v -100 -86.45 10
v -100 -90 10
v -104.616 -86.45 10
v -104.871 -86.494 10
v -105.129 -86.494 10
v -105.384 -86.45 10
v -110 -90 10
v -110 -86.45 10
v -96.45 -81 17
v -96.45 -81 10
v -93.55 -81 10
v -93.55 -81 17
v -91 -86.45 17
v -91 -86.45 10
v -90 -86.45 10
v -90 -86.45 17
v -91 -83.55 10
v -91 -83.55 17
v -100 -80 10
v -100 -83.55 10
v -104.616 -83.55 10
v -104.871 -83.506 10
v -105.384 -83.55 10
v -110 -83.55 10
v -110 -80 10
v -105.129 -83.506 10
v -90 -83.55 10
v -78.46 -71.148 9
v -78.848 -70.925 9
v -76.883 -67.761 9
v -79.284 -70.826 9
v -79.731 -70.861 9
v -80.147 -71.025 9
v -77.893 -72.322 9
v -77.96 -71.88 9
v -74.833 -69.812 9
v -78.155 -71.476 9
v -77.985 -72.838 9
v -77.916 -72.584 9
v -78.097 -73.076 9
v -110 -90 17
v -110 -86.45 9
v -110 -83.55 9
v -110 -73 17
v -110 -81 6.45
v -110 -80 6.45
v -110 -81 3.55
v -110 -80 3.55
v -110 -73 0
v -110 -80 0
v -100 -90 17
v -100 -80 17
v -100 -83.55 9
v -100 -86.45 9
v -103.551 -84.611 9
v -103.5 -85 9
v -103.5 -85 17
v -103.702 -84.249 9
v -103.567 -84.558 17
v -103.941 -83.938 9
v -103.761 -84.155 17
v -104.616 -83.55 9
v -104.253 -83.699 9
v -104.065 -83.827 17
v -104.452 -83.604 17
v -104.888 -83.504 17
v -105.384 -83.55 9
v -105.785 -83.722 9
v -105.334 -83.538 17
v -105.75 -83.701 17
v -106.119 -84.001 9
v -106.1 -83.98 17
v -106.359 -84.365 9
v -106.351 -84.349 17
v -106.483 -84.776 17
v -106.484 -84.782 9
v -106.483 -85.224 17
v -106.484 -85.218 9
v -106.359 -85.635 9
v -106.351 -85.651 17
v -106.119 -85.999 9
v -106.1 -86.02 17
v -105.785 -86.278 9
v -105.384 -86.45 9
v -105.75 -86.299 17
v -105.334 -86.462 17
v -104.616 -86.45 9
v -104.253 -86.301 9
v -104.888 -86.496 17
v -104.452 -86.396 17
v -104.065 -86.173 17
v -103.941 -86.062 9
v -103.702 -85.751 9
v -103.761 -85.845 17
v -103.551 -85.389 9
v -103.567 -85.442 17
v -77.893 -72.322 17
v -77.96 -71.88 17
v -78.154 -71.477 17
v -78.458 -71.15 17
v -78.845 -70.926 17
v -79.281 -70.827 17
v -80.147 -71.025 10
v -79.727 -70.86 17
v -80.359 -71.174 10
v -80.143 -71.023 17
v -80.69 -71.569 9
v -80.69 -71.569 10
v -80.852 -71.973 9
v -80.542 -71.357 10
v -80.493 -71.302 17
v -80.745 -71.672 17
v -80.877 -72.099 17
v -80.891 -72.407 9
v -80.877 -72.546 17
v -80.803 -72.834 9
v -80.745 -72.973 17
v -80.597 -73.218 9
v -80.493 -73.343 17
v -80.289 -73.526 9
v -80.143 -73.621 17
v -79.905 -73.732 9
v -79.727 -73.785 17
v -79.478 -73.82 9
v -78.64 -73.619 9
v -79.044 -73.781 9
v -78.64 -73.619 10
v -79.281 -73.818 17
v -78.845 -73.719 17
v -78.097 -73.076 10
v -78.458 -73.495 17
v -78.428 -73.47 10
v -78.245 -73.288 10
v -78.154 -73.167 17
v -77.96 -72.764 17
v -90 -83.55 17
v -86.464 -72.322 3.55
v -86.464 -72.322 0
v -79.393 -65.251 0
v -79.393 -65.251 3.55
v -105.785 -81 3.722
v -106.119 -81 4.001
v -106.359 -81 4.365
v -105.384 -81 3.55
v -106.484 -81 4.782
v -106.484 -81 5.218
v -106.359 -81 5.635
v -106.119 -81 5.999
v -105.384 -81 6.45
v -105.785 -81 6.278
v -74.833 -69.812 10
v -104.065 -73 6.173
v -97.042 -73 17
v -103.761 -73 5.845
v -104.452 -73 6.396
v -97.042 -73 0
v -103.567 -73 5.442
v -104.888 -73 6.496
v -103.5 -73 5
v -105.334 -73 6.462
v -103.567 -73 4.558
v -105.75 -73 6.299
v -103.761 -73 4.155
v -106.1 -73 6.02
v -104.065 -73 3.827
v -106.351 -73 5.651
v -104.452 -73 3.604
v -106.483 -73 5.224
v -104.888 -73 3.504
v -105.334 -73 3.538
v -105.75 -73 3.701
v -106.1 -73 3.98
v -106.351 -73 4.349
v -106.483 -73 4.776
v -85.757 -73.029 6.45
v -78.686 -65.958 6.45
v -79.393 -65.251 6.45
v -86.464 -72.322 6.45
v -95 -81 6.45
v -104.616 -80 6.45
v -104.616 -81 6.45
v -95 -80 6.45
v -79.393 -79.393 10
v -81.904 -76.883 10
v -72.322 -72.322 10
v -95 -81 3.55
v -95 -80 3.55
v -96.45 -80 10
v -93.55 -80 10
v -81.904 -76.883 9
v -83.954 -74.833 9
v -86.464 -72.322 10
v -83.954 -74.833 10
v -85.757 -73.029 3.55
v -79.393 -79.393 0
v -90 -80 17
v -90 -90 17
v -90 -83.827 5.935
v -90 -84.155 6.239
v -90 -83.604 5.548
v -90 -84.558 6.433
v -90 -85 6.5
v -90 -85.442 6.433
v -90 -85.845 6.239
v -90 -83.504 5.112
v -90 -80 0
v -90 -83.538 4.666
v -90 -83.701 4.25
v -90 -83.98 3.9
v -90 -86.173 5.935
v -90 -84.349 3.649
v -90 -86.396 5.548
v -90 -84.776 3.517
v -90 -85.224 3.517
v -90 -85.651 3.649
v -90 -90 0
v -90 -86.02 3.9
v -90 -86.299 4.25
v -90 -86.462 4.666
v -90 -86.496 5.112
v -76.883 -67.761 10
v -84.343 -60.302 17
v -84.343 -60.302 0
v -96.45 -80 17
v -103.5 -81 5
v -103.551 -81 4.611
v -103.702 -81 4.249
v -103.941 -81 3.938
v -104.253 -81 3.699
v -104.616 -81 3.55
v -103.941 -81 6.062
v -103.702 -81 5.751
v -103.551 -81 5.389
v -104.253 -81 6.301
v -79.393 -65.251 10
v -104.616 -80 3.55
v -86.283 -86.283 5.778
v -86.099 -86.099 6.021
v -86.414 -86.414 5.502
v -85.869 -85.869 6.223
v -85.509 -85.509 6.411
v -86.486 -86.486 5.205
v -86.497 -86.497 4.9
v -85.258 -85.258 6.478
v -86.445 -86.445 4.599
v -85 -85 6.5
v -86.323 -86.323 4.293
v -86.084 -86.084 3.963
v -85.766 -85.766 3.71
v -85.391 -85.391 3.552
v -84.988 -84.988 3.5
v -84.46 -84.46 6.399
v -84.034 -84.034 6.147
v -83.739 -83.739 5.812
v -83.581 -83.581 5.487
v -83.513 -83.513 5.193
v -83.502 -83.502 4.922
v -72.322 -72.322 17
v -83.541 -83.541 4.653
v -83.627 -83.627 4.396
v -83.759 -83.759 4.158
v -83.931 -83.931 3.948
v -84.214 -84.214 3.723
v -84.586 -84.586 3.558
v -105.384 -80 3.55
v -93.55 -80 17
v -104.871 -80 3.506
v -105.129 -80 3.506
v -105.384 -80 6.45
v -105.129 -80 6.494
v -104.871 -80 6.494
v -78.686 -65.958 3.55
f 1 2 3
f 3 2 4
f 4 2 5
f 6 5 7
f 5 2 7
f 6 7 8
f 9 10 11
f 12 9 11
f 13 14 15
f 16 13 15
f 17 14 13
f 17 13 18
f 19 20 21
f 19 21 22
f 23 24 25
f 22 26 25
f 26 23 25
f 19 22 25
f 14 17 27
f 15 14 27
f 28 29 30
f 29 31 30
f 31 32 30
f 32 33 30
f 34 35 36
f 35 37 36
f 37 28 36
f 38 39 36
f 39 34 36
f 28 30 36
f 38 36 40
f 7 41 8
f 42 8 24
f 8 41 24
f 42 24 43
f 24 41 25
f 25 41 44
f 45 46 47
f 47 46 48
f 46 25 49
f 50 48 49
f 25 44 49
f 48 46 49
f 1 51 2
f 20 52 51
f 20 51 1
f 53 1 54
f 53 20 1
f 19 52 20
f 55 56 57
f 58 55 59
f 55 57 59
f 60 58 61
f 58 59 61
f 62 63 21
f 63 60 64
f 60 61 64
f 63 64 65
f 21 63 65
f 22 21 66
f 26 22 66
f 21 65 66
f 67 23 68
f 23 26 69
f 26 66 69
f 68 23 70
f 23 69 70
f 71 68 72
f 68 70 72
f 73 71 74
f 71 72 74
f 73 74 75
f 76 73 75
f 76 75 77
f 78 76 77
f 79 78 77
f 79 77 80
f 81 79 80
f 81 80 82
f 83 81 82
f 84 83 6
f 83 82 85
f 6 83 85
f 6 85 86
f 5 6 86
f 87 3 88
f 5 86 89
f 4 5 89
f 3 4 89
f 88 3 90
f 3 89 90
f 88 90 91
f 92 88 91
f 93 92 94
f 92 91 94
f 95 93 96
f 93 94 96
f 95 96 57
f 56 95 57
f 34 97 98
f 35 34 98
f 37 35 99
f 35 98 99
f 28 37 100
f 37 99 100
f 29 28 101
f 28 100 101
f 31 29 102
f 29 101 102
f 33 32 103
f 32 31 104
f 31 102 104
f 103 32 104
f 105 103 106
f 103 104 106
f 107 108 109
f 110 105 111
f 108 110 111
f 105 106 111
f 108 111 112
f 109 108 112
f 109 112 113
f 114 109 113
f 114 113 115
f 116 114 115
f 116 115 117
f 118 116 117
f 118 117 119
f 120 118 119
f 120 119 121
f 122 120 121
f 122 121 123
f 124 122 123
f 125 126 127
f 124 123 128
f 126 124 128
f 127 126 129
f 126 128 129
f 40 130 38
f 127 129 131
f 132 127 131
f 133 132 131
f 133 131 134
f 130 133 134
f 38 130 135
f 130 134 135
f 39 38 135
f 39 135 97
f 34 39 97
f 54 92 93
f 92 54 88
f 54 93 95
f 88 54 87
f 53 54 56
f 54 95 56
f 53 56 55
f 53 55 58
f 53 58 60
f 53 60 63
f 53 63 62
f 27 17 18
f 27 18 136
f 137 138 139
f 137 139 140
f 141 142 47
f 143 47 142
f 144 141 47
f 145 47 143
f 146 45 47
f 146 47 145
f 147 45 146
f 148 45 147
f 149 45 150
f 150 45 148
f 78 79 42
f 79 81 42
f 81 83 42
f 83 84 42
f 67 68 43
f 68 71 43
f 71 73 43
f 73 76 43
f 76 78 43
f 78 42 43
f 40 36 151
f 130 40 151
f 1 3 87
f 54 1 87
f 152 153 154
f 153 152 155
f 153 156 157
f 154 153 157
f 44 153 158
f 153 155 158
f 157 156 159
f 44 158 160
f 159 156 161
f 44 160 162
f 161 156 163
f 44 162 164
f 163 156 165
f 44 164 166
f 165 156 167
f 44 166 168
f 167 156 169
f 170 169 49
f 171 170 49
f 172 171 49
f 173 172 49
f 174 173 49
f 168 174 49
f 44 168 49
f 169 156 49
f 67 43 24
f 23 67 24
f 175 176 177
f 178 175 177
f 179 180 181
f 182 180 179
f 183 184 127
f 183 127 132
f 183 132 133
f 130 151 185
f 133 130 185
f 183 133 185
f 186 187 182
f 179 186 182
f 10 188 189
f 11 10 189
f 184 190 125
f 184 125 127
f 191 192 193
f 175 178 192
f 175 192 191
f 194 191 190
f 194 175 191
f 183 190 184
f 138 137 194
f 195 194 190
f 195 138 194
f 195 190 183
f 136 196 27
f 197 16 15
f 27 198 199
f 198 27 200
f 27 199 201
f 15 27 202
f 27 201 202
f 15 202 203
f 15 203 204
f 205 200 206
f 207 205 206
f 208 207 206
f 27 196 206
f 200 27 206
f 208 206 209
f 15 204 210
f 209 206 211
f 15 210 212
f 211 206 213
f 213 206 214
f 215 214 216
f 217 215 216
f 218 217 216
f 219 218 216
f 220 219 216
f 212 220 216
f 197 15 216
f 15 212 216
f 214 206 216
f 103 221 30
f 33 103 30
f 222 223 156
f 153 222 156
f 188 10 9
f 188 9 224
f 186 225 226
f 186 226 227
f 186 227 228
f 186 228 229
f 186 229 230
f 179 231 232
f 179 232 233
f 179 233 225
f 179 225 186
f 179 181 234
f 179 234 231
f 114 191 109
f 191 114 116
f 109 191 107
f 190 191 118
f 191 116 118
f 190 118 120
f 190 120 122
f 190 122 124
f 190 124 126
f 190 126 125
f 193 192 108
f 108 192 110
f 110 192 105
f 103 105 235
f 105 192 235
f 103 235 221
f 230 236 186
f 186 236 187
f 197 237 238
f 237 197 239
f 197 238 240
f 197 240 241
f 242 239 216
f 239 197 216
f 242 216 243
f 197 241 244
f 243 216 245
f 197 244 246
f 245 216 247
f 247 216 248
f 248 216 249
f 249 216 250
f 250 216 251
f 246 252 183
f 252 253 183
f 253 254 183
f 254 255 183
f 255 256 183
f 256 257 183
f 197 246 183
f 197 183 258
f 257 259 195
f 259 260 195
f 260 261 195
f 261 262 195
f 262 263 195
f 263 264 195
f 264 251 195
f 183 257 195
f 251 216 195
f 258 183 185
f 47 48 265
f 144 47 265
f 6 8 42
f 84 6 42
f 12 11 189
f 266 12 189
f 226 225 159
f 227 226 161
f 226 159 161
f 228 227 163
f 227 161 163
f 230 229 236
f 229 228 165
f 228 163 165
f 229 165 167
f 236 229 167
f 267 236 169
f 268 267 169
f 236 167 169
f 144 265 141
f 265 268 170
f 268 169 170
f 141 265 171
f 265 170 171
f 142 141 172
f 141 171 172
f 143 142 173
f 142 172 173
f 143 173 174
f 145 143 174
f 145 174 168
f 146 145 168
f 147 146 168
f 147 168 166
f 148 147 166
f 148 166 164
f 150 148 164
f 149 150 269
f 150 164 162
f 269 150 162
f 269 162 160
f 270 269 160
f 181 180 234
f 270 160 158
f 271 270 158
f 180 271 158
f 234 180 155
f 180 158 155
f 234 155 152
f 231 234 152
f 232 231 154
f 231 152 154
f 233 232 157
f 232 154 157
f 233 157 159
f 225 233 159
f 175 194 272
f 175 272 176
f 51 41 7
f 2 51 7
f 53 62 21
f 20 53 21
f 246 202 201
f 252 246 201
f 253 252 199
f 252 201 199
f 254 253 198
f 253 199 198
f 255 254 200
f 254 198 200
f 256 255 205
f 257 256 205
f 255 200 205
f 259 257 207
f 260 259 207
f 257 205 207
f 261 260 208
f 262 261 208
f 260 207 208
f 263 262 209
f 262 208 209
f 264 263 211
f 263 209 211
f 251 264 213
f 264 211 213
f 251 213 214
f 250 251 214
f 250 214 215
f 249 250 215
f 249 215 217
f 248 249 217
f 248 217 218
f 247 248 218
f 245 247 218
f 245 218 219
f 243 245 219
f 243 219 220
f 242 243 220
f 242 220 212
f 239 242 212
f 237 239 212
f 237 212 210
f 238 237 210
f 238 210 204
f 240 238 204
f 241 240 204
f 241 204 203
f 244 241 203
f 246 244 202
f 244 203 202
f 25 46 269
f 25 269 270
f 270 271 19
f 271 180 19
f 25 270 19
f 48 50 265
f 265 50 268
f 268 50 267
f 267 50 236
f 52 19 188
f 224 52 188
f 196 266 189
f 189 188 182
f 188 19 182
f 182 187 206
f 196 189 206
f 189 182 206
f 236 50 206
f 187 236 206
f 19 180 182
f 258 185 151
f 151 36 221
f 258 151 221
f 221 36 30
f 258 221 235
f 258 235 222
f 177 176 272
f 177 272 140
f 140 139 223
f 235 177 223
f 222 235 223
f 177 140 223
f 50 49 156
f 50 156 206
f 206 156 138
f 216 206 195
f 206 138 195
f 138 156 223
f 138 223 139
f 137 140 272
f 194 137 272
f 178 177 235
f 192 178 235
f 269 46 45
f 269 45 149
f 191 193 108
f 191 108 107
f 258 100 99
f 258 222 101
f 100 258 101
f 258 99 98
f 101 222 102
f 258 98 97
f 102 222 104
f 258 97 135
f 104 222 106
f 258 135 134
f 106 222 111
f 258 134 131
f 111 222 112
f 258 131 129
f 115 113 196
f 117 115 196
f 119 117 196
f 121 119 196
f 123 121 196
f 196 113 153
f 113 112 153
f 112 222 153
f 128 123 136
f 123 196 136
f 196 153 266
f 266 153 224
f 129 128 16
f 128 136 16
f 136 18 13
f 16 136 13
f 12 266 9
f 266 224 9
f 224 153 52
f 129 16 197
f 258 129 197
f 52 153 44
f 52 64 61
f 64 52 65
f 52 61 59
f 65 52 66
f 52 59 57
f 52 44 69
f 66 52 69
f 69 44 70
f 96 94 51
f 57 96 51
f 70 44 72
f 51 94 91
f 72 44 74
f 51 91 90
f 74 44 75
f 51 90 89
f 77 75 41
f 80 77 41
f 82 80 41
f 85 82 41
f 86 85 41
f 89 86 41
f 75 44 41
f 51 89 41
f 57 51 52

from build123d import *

# Parameters (mm, degrees)
MAIN_DEPTH          = 17
CUT_EXTRUDE1_DEPTH  = 10
SKETCH3_R           = 1.5
CUT_EXTRUDE2_DEPTH  = 18
SKETCH4_W           = 2.9
SKETCH4_H           = 1
SKETCH4_W_2         = 1
SKETCH4_H_2         = 2.9
BOSS_EXTRUDE1_DEPTH = 7
SKETCH5_W           = 15
SKETCH5_H           = 2.9
BOSS_EXTRUDE2_DEPTH = 1
SKETCH6_R           = 1.5
CUT_EXTRUDE3_DEPTH  = 18
BOSS_EXTRUDE3_DEPTH = 10
SKETCH8_R           = 1.5
CUT_EXTRUDE4_DEPTH  = 18
SKETCH9_R           = 1.5
CUT_EXTRUDE5_DEPTH  = 18.67766953


with BuildPart() as part:
    # Sketch1 → Main (new body)
    with BuildSketch(Plane.XY):
        Polygon((-90, -90), (-72.32233047, -72.32233047), (-84.343145751, -60.30151519), (-97.04163056, -73), (-110, -73), (-110, -80), (-90, -80), align=None)
    extrude(amount=MAIN_DEPTH)

    # Sketch2 → Cut-Extrude1 (cut)
    with BuildSketch(Plane(origin=(-72.32233047, -72.32233047, 0), x_dir=(0.707106781, -0.707106781, 0), z_dir=(0.707106781, 0.707106781, 0))):
        Polygon((-3.55, -10), (0, -10), (0, 0), (-10, 0), (-10, -3.55), (-9, -3.55), (-9, -6.45), (-10, -6.45), (-10, -10), (-6.45, -10), (-6.45, -9), (-3.55, -9), align=None)
    extrude(amount=-CUT_EXTRUDE1_DEPTH, mode=Mode.SUBTRACT)

    # Sketch3 → Cut-Extrude2 (cut, through all)
    with BuildSketch(Plane.XY.offset(17)):
        with Locations((-79.393398282, -72.32233047)):
            Circle(SKETCH3_R)
    extrude(amount=-CUT_EXTRUDE2_DEPTH, mode=Mode.SUBTRACT)

    # Sketch4 → Boss-Extrude1 (add)
    with BuildSketch(Plane.XY.offset(10)):
        with Locations((-95, -80.5)):
            Rectangle(SKETCH4_W, SKETCH4_H)
        with Locations((-90.5, -85)):
            Rectangle(SKETCH4_W_2, SKETCH4_H_2)
    extrude(amount=BOSS_EXTRUDE1_DEPTH)

    # Sketch5 → Boss-Extrude2 (add)
    with BuildSketch(Plane.XZ.offset(80)):
        with Locations((-102.5, 5)):
            Rectangle(SKETCH5_W, SKETCH5_H)
    extrude(amount=BOSS_EXTRUDE2_DEPTH)

    # Sketch6 → Cut-Extrude3 (cut, through all)
    with BuildSketch(Plane(origin=(0, -73, 0), x_dir=(1, 0, 0), z_dir=(0, 1, 0))):
        with Locations((-105, -5)):
            Circle(SKETCH6_R)
    extrude(amount=-CUT_EXTRUDE3_DEPTH, mode=Mode.SUBTRACT)

    # Sketch7 → Boss-Extrude3 (add)
    with BuildSketch(Plane.ZY.offset(110)):
        Polygon((17, -80), (17, -90), (10, -90), (10, -86.45), (9, -86.45), (9, -83.55), (10, -83.55), (10, -80), align=None)
    extrude(amount=-BOSS_EXTRUDE3_DEPTH)

    # Sketch8 → Cut-Extrude4 (cut, through all)
    with BuildSketch(Plane.XY.offset(17)):
        with Locations((-105, -85)):
            Circle(SKETCH8_R)
    extrude(amount=-CUT_EXTRUDE4_DEPTH, mode=Mode.SUBTRACT)

    # Sketch9 → Cut-Extrude5 (cut, through all)
    with BuildSketch(Plane.ZY.offset(90)):
        with Locations((5, -85)):
            Circle(SKETCH9_R)
    extrude(amount=-CUT_EXTRUDE5_DEPTH, mode=Mode.SUBTRACT)


solid = part.part
